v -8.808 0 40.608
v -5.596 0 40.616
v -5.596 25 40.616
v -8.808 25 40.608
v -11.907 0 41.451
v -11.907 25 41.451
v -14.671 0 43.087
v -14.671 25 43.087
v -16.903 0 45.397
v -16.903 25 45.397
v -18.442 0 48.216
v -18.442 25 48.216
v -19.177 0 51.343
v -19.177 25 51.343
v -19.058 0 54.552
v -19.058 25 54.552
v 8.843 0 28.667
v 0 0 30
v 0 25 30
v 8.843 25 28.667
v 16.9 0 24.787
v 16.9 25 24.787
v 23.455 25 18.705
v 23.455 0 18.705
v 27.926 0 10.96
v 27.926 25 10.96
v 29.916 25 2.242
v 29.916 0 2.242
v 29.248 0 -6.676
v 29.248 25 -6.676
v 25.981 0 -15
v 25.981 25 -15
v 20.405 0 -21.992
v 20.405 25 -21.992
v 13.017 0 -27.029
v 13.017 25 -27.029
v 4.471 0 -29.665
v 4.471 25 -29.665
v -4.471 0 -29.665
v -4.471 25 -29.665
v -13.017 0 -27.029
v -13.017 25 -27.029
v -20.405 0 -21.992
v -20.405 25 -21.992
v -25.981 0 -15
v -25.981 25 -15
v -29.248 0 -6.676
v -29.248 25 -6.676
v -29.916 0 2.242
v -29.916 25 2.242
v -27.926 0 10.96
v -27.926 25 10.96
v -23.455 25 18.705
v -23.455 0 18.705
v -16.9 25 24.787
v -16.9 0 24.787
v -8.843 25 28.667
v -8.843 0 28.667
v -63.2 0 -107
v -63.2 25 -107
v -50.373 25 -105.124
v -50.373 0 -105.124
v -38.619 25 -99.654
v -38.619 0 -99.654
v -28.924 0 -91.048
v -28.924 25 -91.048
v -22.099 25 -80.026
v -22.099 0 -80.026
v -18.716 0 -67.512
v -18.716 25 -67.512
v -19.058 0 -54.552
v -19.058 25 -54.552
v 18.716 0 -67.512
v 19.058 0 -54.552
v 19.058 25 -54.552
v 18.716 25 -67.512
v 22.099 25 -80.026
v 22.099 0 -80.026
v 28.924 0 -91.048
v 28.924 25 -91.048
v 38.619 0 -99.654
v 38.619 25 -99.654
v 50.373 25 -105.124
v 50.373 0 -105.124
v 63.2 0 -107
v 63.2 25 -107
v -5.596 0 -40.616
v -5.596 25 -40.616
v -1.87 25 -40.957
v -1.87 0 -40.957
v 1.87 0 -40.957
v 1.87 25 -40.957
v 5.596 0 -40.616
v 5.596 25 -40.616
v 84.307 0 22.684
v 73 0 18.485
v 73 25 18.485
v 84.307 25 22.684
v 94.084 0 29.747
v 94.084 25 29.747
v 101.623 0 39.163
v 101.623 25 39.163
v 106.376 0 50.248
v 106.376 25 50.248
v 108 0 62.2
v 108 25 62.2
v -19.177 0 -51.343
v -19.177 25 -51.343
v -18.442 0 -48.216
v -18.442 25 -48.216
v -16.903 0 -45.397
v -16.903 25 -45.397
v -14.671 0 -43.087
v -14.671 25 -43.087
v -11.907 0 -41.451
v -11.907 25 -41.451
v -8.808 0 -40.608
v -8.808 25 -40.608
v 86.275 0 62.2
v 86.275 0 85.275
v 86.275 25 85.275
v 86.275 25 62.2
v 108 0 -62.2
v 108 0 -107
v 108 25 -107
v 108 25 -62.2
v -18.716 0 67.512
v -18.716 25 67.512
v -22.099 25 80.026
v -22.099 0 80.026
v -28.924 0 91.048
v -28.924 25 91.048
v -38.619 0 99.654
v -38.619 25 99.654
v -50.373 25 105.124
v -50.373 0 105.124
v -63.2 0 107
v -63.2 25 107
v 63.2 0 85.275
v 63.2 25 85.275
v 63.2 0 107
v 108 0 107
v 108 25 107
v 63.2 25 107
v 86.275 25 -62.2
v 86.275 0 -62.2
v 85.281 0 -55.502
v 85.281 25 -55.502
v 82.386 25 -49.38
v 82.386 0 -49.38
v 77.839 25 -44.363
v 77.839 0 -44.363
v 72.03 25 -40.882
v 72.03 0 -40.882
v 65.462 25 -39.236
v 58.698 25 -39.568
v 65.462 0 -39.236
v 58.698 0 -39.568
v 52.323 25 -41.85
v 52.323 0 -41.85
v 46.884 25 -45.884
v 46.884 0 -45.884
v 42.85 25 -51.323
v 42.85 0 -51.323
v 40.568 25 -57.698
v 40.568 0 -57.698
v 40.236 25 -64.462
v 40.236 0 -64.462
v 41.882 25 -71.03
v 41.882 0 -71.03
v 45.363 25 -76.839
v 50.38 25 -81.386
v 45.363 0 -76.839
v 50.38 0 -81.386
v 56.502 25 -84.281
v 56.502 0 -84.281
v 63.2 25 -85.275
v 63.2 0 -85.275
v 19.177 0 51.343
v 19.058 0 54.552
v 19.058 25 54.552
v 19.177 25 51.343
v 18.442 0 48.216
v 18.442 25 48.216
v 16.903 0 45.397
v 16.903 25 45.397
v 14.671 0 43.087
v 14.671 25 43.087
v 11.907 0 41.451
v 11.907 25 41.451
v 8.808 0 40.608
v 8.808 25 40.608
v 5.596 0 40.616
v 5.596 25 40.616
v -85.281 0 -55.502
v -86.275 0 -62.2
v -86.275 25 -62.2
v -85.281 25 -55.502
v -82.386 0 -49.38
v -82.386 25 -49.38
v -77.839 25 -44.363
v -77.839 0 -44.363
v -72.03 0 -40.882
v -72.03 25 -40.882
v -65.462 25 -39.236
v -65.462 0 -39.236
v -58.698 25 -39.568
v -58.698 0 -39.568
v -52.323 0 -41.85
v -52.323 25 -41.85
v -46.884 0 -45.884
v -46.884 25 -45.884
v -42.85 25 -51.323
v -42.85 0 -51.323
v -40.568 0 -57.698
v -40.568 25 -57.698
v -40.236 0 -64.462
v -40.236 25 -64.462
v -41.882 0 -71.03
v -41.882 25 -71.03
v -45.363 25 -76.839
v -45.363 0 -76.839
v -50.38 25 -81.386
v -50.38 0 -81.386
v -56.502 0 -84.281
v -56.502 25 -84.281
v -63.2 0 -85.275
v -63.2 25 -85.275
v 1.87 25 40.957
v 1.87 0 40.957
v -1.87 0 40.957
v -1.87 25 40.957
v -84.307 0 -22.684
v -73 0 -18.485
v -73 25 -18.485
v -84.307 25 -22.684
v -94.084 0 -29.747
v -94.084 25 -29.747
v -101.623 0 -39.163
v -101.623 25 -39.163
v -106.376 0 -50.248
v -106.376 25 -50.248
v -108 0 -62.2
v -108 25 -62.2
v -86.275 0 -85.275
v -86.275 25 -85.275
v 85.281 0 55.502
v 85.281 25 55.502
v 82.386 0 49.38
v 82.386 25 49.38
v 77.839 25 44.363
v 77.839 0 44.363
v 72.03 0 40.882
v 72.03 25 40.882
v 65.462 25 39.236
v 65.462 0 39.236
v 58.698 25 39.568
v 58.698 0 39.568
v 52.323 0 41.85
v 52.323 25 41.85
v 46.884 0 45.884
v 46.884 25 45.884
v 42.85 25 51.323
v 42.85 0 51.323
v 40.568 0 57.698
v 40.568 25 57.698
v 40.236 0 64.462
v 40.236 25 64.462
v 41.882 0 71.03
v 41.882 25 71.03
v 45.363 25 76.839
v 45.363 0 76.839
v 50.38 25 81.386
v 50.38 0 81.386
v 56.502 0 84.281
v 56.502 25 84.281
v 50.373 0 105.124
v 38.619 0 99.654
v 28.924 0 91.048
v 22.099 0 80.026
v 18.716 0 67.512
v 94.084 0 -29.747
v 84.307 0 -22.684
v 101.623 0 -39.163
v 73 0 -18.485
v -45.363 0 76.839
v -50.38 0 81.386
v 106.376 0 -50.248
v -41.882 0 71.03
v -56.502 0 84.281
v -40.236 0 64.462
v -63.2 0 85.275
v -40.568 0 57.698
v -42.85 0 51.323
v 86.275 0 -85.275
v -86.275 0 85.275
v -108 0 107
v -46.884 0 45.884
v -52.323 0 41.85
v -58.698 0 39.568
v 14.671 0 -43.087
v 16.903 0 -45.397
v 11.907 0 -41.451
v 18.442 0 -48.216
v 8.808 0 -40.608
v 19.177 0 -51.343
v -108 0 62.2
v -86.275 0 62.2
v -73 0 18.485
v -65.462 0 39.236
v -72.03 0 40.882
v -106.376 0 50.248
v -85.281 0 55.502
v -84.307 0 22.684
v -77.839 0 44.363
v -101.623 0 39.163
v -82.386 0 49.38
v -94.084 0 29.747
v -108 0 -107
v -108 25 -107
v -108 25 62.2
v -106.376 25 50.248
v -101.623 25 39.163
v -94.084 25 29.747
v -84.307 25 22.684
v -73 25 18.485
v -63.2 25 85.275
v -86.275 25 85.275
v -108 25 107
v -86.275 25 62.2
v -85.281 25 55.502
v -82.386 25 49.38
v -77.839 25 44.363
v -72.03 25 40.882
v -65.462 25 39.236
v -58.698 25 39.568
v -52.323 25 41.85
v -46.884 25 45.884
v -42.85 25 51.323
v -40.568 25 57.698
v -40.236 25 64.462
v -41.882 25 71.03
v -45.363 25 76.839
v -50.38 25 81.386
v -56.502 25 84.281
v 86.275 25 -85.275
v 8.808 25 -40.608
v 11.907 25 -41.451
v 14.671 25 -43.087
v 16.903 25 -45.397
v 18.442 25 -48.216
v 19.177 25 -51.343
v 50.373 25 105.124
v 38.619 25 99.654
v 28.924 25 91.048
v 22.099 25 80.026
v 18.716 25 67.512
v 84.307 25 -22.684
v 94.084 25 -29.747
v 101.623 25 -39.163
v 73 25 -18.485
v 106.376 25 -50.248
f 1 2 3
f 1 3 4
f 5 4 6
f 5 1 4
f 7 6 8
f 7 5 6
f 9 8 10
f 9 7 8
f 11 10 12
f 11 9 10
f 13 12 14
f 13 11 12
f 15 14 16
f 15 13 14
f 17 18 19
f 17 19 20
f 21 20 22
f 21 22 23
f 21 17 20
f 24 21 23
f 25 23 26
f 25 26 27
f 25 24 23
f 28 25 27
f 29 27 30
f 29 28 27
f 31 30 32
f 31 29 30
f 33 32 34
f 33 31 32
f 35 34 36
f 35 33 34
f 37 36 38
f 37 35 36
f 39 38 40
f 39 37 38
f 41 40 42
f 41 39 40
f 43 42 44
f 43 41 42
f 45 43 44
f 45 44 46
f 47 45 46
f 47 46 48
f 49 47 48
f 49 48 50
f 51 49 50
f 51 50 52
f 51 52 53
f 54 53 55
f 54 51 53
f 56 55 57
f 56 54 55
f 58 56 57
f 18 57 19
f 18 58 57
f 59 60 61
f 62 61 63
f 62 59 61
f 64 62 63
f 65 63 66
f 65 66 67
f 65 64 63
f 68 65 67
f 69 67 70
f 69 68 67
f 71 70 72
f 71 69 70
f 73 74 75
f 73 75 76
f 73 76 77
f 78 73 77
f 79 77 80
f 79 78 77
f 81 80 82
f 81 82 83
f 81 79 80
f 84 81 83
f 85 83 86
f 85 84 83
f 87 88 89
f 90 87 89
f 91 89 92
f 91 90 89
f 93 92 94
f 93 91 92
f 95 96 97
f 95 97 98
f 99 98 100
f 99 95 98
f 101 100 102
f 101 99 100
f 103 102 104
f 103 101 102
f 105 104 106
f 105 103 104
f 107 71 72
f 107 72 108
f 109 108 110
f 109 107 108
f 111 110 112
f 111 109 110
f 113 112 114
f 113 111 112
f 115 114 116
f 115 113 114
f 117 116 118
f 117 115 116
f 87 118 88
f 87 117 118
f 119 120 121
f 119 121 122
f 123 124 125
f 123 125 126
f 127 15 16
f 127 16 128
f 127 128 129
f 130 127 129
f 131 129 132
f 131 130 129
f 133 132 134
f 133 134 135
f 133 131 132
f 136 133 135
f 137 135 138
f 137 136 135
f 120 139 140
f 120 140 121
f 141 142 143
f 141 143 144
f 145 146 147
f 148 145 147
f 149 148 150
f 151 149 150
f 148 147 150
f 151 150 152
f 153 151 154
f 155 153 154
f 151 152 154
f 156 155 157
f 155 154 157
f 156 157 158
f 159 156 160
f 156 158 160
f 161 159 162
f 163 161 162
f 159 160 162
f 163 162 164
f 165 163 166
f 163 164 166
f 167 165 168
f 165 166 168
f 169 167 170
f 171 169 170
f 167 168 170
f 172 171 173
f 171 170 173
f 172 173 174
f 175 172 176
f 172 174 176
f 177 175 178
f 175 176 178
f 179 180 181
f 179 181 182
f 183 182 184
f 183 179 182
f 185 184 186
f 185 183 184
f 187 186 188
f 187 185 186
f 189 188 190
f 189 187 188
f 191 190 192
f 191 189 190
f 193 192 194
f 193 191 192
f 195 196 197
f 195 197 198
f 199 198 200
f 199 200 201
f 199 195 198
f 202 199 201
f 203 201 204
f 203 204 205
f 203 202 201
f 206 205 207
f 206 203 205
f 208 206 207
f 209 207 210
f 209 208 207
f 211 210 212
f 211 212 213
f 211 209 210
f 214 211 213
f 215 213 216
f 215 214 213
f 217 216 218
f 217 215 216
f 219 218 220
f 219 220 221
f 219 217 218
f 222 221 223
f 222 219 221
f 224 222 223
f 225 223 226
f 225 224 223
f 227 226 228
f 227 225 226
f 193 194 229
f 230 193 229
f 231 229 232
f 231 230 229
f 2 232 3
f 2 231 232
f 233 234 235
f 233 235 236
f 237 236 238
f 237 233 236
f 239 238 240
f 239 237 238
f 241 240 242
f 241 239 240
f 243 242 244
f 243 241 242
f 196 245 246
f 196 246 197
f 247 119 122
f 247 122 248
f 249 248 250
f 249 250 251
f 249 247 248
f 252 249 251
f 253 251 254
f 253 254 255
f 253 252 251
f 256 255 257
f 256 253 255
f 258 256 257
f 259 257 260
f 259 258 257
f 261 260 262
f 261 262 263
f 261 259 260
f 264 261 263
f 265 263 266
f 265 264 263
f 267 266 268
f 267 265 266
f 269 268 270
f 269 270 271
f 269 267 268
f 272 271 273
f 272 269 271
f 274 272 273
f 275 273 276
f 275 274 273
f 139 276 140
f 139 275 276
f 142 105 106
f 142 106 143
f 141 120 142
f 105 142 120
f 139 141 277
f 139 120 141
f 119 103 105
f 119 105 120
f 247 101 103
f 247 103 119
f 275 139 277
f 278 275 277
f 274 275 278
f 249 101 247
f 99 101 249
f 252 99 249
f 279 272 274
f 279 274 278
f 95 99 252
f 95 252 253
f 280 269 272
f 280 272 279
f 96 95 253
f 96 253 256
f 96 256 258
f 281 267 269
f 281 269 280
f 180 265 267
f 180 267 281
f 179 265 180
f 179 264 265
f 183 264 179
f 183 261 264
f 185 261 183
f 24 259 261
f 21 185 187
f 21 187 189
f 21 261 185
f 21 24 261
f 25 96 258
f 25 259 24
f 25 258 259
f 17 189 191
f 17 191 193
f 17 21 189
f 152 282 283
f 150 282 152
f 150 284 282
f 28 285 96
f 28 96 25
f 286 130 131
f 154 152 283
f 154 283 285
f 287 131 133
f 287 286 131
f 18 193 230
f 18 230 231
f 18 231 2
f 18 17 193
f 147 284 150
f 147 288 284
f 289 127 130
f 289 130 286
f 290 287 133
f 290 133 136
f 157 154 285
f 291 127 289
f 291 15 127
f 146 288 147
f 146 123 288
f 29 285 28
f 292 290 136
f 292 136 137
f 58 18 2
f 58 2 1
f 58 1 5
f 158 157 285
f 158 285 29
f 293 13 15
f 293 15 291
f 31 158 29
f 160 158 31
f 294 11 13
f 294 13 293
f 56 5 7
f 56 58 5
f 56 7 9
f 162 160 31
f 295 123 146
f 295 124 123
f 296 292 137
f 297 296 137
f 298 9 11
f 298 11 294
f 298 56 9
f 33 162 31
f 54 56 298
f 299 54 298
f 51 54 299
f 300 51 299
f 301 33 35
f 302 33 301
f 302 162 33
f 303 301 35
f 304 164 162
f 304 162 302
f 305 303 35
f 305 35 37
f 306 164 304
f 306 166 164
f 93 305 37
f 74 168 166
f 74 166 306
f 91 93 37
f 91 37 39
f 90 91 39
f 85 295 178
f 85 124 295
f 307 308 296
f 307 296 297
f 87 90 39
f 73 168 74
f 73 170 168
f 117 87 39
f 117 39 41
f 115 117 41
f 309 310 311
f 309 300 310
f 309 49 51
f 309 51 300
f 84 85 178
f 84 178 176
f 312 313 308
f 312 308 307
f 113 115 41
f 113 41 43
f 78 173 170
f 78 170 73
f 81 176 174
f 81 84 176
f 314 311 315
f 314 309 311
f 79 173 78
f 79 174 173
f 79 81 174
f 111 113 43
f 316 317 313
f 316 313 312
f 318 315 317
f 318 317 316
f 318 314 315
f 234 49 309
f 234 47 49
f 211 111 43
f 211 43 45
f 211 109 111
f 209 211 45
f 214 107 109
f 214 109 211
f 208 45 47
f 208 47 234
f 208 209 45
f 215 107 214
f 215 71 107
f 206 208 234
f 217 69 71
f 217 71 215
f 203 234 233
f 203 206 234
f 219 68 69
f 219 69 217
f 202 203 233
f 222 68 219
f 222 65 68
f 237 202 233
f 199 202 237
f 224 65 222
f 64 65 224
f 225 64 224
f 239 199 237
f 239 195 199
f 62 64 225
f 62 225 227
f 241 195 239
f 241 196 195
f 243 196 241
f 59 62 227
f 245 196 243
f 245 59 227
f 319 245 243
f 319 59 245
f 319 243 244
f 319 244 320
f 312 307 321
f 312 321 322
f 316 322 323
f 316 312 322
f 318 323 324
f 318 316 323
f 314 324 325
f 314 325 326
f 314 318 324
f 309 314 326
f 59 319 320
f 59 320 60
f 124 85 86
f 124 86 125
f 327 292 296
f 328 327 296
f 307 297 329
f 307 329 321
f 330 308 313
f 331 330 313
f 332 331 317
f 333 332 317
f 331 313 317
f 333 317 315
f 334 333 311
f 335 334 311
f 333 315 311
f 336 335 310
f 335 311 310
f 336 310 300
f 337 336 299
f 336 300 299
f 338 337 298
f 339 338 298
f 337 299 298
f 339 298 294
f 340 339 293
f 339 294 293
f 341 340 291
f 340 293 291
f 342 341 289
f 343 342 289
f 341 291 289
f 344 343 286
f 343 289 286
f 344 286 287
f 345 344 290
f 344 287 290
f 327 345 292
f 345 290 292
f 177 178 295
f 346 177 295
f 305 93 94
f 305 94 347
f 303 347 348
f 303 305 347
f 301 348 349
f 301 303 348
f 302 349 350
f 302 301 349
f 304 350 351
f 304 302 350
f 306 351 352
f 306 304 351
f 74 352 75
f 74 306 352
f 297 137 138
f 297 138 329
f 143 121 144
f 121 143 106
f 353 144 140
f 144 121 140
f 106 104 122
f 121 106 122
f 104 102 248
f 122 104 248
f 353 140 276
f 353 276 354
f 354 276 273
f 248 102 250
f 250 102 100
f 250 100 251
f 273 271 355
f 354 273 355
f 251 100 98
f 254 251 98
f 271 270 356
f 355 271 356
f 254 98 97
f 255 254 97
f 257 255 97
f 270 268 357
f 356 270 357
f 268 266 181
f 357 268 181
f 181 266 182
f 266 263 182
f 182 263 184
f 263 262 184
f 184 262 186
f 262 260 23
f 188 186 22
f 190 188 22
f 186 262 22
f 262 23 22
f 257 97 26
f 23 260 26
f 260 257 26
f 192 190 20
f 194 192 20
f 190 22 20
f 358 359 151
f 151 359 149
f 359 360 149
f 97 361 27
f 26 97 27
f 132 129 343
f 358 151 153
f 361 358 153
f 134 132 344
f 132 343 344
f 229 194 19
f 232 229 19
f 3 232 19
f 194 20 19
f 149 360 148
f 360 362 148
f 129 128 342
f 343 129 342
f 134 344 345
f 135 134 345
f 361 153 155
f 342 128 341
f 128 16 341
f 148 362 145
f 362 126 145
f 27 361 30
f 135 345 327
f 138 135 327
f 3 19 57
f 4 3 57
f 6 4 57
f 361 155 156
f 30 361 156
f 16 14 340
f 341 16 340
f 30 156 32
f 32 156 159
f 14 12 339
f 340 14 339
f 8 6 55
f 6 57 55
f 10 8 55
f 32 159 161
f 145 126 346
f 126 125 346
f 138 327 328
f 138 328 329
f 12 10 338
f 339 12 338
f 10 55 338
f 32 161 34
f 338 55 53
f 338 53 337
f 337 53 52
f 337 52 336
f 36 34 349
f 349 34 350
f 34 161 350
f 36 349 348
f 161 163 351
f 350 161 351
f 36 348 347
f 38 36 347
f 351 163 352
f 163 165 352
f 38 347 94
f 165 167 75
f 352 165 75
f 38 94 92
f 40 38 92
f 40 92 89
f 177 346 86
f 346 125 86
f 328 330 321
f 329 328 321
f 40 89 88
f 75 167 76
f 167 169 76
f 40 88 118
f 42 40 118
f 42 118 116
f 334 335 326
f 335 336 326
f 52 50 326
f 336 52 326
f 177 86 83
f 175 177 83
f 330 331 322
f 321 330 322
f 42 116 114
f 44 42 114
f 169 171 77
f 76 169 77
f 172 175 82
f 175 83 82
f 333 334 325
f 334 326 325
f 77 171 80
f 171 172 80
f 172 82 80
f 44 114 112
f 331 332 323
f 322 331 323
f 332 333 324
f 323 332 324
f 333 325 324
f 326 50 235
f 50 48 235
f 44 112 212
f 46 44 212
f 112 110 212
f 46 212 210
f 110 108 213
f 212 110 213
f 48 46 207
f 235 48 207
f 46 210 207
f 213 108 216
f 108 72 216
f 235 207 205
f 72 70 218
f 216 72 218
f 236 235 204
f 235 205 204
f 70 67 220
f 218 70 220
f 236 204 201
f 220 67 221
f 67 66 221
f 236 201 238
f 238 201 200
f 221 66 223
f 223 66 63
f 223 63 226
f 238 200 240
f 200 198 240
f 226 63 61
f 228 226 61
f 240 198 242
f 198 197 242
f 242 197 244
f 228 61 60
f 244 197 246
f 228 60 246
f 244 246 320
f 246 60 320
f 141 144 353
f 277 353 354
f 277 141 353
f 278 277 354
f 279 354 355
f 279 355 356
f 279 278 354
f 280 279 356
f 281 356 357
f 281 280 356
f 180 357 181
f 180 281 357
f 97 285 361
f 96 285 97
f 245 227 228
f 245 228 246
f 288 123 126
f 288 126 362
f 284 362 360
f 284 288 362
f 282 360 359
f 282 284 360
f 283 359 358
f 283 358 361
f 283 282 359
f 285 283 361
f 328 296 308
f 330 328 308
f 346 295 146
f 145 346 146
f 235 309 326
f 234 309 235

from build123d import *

# Parameters (mm, degrees)
SKETCH1_R           = 30
BOSS_EXTRUDE1_DEPTH = 25


with BuildPart() as part:
    # Sketch1 → Boss-Extrude1 (new body)
    with BuildSketch(Plane(origin=(0, 0, 0), x_dir=(1, 0, 0), z_dir=(0, 1, 0))):
        with BuildLine():
            Line((73, 18.485014011), (73, -18.485014011))
            ThreePointArc((73, -18.485014011), (98.171988791, -34.2), (108, -62.2))
            Line((108, -62.2), (108, -107))
            Line((108, -107), (63.2, -107))
            ThreePointArc((63.2, -107), (28.924287458, -91.048146036), (19.057555316, -54.552479005))
            ThreePointArc((19.057555316, -54.552479005), (15.86461811, -44.166949194), (5.59587046, -40.616329645))
            ThreePointArc((5.59587046, -40.616329645), (0, -41), (-5.59587046, -40.616329645))
            ThreePointArc((-5.59587046, -40.616329645), (-15.86461811, -44.166949194), (-19.057555316, -54.552479005))
            ThreePointArc((-19.057555316, -54.552479005), (-28.924287458, -91.048146036), (-63.2, -107))
            Line((-63.2, -107), (-108, -107))
            Line((-108, -107), (-108, -62.2))
            ThreePointArc((-108, -62.2), (-98.171988791, -34.2), (-73, -18.485014011))
            Line((-73, -18.485014011), (-73, 18.485014011))
            ThreePointArc((-73, 18.485014011), (-98.171988791, 34.2), (-108, 62.2))
            Line((-108, 62.2), (-108, 107))
            Line((-108, 107), (-63.2, 107))
            ThreePointArc((-63.2, 107), (-28.924287458, 91.048146036), (-19.057555316, 54.552479005))
            ThreePointArc((-19.057555316, 54.552479005), (-15.86461811, 44.166949194), (-5.59587046, 40.616329645))
            ThreePointArc((-5.59587046, 40.616329645), (0, 41), (5.59587046, 40.616329645))
            ThreePointArc((5.59587046, 40.616329645), (15.86461811, 44.166949194), (19.057555316, 54.552479005))
            ThreePointArc((19.057555316, 54.552479005), (28.924287458, 91.048146036), (63.2, 107))
            Line((63.2, 107), (108, 107))
            Line((108, 107), (108, 62.2))
            ThreePointArc((108, 62.2), (98.171988791, 34.2), (73, 18.485014011))
        make_face()
        with Locations(Location((0, 0, 0), (0, 0, 270))):
            Circle(SKETCH1_R, mode=Mode.SUBTRACT)
        with BuildLine():
            Line((86.274940548, 85.274940548), (86.274940548, 62.2))
            ThreePointArc((86.274940548, 62.2), (46.883553063, 45.883553063), (63.2, 85.274940548))
            Line((63.2, 85.274940548), (86.274940548, 85.274940548))
        make_face(mode=Mode.SUBTRACT)
        with BuildLine():
            Line((86.274940548, -85.274940548), (86.274940548, -62.2))
            ThreePointArc((86.274940548, -62.2), (46.883553063, -45.883553063), (63.2, -85.274940548))
            Line((63.2, -85.274940548), (86.274940548, -85.274940548))
        make_face(mode=Mode.SUBTRACT)
        with BuildLine():
            Line((-86.274940548, -85.274940548), (-86.274940548, -62.2))
            ThreePointArc((-86.274940548, -62.2), (-46.883553063, -45.883553063), (-63.2, -85.274940548))
            Line((-63.2, -85.274940548), (-86.274940548, -85.274940548))
        make_face(mode=Mode.SUBTRACT)
        with BuildLine():
            Line((-63.2, 85.274940548), (-86.274940548, 85.274940548))
            Line((-86.274940548, 85.274940548), (-86.274940548, 62.2))
            ThreePointArc((-86.274940548, 62.2), (-46.883553063, 45.883553063), (-63.2, 85.274940548))
        make_face(mode=Mode.SUBTRACT)
    extrude(amount=BOSS_EXTRUDE1_DEPTH)


solid = part.part
